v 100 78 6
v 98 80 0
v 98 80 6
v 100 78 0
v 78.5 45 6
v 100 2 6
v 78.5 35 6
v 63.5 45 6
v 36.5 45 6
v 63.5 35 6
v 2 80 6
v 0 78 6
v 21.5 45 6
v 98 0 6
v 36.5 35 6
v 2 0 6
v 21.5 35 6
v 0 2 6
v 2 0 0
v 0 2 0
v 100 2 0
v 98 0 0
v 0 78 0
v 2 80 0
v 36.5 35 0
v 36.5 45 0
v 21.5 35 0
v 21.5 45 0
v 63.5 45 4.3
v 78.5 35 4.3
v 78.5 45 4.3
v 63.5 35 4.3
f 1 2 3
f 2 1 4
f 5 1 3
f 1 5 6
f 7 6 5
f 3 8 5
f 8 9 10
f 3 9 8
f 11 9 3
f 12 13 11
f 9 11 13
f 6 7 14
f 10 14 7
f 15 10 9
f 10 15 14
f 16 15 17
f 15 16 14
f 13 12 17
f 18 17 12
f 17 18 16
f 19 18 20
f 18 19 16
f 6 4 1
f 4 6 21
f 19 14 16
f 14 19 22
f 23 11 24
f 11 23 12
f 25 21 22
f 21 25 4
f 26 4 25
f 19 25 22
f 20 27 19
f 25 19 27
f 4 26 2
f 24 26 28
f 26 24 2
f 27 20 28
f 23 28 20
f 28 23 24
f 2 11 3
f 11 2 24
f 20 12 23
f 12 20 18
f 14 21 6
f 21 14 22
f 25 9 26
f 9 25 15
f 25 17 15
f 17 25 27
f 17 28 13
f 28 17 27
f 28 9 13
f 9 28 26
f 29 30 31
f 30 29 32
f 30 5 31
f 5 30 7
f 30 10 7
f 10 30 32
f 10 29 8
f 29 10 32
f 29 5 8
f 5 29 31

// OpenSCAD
$fn = 32;

// ----------------------------------------------------------------------
// Windowed plate: 2 voids, 100 x 80 x 6 mm
// ----------------------------------------------------------------------

// --- parameters (mm) ---
plate_l = 100;            // plate length, X
plate_w = 80;             // plate width, Y
plate_t = 6;              // plate thickness, Z
edge_margin = 8;          // wall from the plate edge to any window
windows = 2;              // number of windows in the row
win_l = 15;               // window length
win_w = 10;               // window width
win_pitch = 42;           // window pitch along X
depth_1 = 6;              // depth of void 1 (full thickness = through)
depth_2 = 1.7;            // depth of void 2 (full thickness = through)
corner_c = 2;             // corner chamfer of the plate

profile = [[2, 0], [98, 0], [100, 2], [100, 78], [98, 80], [2, 80], [0, 78], [0, 2]];  // primary outline, 8 points, counter clockwise
void_1 = [[21.5, 35], [36.5, 35], [36.5, 45], [21.5, 45]];  // window 1 of the row, 4 points
void_2 = [[63.5, 35], [78.5, 35], [78.5, 45], [63.5, 45]];  // window 2 of the row, 4 points

// --- the one profile operation ---
difference() {
  linear_extrude(height = plate_t) polygon(points = profile);
  translate([0, 0, -1])
    linear_extrude(height = plate_t + 2) polygon(points = void_1);
  translate([0, 0, plate_t - depth_2])
    linear_extrude(height = depth_2 + 1) polygon(points = void_2);
}
